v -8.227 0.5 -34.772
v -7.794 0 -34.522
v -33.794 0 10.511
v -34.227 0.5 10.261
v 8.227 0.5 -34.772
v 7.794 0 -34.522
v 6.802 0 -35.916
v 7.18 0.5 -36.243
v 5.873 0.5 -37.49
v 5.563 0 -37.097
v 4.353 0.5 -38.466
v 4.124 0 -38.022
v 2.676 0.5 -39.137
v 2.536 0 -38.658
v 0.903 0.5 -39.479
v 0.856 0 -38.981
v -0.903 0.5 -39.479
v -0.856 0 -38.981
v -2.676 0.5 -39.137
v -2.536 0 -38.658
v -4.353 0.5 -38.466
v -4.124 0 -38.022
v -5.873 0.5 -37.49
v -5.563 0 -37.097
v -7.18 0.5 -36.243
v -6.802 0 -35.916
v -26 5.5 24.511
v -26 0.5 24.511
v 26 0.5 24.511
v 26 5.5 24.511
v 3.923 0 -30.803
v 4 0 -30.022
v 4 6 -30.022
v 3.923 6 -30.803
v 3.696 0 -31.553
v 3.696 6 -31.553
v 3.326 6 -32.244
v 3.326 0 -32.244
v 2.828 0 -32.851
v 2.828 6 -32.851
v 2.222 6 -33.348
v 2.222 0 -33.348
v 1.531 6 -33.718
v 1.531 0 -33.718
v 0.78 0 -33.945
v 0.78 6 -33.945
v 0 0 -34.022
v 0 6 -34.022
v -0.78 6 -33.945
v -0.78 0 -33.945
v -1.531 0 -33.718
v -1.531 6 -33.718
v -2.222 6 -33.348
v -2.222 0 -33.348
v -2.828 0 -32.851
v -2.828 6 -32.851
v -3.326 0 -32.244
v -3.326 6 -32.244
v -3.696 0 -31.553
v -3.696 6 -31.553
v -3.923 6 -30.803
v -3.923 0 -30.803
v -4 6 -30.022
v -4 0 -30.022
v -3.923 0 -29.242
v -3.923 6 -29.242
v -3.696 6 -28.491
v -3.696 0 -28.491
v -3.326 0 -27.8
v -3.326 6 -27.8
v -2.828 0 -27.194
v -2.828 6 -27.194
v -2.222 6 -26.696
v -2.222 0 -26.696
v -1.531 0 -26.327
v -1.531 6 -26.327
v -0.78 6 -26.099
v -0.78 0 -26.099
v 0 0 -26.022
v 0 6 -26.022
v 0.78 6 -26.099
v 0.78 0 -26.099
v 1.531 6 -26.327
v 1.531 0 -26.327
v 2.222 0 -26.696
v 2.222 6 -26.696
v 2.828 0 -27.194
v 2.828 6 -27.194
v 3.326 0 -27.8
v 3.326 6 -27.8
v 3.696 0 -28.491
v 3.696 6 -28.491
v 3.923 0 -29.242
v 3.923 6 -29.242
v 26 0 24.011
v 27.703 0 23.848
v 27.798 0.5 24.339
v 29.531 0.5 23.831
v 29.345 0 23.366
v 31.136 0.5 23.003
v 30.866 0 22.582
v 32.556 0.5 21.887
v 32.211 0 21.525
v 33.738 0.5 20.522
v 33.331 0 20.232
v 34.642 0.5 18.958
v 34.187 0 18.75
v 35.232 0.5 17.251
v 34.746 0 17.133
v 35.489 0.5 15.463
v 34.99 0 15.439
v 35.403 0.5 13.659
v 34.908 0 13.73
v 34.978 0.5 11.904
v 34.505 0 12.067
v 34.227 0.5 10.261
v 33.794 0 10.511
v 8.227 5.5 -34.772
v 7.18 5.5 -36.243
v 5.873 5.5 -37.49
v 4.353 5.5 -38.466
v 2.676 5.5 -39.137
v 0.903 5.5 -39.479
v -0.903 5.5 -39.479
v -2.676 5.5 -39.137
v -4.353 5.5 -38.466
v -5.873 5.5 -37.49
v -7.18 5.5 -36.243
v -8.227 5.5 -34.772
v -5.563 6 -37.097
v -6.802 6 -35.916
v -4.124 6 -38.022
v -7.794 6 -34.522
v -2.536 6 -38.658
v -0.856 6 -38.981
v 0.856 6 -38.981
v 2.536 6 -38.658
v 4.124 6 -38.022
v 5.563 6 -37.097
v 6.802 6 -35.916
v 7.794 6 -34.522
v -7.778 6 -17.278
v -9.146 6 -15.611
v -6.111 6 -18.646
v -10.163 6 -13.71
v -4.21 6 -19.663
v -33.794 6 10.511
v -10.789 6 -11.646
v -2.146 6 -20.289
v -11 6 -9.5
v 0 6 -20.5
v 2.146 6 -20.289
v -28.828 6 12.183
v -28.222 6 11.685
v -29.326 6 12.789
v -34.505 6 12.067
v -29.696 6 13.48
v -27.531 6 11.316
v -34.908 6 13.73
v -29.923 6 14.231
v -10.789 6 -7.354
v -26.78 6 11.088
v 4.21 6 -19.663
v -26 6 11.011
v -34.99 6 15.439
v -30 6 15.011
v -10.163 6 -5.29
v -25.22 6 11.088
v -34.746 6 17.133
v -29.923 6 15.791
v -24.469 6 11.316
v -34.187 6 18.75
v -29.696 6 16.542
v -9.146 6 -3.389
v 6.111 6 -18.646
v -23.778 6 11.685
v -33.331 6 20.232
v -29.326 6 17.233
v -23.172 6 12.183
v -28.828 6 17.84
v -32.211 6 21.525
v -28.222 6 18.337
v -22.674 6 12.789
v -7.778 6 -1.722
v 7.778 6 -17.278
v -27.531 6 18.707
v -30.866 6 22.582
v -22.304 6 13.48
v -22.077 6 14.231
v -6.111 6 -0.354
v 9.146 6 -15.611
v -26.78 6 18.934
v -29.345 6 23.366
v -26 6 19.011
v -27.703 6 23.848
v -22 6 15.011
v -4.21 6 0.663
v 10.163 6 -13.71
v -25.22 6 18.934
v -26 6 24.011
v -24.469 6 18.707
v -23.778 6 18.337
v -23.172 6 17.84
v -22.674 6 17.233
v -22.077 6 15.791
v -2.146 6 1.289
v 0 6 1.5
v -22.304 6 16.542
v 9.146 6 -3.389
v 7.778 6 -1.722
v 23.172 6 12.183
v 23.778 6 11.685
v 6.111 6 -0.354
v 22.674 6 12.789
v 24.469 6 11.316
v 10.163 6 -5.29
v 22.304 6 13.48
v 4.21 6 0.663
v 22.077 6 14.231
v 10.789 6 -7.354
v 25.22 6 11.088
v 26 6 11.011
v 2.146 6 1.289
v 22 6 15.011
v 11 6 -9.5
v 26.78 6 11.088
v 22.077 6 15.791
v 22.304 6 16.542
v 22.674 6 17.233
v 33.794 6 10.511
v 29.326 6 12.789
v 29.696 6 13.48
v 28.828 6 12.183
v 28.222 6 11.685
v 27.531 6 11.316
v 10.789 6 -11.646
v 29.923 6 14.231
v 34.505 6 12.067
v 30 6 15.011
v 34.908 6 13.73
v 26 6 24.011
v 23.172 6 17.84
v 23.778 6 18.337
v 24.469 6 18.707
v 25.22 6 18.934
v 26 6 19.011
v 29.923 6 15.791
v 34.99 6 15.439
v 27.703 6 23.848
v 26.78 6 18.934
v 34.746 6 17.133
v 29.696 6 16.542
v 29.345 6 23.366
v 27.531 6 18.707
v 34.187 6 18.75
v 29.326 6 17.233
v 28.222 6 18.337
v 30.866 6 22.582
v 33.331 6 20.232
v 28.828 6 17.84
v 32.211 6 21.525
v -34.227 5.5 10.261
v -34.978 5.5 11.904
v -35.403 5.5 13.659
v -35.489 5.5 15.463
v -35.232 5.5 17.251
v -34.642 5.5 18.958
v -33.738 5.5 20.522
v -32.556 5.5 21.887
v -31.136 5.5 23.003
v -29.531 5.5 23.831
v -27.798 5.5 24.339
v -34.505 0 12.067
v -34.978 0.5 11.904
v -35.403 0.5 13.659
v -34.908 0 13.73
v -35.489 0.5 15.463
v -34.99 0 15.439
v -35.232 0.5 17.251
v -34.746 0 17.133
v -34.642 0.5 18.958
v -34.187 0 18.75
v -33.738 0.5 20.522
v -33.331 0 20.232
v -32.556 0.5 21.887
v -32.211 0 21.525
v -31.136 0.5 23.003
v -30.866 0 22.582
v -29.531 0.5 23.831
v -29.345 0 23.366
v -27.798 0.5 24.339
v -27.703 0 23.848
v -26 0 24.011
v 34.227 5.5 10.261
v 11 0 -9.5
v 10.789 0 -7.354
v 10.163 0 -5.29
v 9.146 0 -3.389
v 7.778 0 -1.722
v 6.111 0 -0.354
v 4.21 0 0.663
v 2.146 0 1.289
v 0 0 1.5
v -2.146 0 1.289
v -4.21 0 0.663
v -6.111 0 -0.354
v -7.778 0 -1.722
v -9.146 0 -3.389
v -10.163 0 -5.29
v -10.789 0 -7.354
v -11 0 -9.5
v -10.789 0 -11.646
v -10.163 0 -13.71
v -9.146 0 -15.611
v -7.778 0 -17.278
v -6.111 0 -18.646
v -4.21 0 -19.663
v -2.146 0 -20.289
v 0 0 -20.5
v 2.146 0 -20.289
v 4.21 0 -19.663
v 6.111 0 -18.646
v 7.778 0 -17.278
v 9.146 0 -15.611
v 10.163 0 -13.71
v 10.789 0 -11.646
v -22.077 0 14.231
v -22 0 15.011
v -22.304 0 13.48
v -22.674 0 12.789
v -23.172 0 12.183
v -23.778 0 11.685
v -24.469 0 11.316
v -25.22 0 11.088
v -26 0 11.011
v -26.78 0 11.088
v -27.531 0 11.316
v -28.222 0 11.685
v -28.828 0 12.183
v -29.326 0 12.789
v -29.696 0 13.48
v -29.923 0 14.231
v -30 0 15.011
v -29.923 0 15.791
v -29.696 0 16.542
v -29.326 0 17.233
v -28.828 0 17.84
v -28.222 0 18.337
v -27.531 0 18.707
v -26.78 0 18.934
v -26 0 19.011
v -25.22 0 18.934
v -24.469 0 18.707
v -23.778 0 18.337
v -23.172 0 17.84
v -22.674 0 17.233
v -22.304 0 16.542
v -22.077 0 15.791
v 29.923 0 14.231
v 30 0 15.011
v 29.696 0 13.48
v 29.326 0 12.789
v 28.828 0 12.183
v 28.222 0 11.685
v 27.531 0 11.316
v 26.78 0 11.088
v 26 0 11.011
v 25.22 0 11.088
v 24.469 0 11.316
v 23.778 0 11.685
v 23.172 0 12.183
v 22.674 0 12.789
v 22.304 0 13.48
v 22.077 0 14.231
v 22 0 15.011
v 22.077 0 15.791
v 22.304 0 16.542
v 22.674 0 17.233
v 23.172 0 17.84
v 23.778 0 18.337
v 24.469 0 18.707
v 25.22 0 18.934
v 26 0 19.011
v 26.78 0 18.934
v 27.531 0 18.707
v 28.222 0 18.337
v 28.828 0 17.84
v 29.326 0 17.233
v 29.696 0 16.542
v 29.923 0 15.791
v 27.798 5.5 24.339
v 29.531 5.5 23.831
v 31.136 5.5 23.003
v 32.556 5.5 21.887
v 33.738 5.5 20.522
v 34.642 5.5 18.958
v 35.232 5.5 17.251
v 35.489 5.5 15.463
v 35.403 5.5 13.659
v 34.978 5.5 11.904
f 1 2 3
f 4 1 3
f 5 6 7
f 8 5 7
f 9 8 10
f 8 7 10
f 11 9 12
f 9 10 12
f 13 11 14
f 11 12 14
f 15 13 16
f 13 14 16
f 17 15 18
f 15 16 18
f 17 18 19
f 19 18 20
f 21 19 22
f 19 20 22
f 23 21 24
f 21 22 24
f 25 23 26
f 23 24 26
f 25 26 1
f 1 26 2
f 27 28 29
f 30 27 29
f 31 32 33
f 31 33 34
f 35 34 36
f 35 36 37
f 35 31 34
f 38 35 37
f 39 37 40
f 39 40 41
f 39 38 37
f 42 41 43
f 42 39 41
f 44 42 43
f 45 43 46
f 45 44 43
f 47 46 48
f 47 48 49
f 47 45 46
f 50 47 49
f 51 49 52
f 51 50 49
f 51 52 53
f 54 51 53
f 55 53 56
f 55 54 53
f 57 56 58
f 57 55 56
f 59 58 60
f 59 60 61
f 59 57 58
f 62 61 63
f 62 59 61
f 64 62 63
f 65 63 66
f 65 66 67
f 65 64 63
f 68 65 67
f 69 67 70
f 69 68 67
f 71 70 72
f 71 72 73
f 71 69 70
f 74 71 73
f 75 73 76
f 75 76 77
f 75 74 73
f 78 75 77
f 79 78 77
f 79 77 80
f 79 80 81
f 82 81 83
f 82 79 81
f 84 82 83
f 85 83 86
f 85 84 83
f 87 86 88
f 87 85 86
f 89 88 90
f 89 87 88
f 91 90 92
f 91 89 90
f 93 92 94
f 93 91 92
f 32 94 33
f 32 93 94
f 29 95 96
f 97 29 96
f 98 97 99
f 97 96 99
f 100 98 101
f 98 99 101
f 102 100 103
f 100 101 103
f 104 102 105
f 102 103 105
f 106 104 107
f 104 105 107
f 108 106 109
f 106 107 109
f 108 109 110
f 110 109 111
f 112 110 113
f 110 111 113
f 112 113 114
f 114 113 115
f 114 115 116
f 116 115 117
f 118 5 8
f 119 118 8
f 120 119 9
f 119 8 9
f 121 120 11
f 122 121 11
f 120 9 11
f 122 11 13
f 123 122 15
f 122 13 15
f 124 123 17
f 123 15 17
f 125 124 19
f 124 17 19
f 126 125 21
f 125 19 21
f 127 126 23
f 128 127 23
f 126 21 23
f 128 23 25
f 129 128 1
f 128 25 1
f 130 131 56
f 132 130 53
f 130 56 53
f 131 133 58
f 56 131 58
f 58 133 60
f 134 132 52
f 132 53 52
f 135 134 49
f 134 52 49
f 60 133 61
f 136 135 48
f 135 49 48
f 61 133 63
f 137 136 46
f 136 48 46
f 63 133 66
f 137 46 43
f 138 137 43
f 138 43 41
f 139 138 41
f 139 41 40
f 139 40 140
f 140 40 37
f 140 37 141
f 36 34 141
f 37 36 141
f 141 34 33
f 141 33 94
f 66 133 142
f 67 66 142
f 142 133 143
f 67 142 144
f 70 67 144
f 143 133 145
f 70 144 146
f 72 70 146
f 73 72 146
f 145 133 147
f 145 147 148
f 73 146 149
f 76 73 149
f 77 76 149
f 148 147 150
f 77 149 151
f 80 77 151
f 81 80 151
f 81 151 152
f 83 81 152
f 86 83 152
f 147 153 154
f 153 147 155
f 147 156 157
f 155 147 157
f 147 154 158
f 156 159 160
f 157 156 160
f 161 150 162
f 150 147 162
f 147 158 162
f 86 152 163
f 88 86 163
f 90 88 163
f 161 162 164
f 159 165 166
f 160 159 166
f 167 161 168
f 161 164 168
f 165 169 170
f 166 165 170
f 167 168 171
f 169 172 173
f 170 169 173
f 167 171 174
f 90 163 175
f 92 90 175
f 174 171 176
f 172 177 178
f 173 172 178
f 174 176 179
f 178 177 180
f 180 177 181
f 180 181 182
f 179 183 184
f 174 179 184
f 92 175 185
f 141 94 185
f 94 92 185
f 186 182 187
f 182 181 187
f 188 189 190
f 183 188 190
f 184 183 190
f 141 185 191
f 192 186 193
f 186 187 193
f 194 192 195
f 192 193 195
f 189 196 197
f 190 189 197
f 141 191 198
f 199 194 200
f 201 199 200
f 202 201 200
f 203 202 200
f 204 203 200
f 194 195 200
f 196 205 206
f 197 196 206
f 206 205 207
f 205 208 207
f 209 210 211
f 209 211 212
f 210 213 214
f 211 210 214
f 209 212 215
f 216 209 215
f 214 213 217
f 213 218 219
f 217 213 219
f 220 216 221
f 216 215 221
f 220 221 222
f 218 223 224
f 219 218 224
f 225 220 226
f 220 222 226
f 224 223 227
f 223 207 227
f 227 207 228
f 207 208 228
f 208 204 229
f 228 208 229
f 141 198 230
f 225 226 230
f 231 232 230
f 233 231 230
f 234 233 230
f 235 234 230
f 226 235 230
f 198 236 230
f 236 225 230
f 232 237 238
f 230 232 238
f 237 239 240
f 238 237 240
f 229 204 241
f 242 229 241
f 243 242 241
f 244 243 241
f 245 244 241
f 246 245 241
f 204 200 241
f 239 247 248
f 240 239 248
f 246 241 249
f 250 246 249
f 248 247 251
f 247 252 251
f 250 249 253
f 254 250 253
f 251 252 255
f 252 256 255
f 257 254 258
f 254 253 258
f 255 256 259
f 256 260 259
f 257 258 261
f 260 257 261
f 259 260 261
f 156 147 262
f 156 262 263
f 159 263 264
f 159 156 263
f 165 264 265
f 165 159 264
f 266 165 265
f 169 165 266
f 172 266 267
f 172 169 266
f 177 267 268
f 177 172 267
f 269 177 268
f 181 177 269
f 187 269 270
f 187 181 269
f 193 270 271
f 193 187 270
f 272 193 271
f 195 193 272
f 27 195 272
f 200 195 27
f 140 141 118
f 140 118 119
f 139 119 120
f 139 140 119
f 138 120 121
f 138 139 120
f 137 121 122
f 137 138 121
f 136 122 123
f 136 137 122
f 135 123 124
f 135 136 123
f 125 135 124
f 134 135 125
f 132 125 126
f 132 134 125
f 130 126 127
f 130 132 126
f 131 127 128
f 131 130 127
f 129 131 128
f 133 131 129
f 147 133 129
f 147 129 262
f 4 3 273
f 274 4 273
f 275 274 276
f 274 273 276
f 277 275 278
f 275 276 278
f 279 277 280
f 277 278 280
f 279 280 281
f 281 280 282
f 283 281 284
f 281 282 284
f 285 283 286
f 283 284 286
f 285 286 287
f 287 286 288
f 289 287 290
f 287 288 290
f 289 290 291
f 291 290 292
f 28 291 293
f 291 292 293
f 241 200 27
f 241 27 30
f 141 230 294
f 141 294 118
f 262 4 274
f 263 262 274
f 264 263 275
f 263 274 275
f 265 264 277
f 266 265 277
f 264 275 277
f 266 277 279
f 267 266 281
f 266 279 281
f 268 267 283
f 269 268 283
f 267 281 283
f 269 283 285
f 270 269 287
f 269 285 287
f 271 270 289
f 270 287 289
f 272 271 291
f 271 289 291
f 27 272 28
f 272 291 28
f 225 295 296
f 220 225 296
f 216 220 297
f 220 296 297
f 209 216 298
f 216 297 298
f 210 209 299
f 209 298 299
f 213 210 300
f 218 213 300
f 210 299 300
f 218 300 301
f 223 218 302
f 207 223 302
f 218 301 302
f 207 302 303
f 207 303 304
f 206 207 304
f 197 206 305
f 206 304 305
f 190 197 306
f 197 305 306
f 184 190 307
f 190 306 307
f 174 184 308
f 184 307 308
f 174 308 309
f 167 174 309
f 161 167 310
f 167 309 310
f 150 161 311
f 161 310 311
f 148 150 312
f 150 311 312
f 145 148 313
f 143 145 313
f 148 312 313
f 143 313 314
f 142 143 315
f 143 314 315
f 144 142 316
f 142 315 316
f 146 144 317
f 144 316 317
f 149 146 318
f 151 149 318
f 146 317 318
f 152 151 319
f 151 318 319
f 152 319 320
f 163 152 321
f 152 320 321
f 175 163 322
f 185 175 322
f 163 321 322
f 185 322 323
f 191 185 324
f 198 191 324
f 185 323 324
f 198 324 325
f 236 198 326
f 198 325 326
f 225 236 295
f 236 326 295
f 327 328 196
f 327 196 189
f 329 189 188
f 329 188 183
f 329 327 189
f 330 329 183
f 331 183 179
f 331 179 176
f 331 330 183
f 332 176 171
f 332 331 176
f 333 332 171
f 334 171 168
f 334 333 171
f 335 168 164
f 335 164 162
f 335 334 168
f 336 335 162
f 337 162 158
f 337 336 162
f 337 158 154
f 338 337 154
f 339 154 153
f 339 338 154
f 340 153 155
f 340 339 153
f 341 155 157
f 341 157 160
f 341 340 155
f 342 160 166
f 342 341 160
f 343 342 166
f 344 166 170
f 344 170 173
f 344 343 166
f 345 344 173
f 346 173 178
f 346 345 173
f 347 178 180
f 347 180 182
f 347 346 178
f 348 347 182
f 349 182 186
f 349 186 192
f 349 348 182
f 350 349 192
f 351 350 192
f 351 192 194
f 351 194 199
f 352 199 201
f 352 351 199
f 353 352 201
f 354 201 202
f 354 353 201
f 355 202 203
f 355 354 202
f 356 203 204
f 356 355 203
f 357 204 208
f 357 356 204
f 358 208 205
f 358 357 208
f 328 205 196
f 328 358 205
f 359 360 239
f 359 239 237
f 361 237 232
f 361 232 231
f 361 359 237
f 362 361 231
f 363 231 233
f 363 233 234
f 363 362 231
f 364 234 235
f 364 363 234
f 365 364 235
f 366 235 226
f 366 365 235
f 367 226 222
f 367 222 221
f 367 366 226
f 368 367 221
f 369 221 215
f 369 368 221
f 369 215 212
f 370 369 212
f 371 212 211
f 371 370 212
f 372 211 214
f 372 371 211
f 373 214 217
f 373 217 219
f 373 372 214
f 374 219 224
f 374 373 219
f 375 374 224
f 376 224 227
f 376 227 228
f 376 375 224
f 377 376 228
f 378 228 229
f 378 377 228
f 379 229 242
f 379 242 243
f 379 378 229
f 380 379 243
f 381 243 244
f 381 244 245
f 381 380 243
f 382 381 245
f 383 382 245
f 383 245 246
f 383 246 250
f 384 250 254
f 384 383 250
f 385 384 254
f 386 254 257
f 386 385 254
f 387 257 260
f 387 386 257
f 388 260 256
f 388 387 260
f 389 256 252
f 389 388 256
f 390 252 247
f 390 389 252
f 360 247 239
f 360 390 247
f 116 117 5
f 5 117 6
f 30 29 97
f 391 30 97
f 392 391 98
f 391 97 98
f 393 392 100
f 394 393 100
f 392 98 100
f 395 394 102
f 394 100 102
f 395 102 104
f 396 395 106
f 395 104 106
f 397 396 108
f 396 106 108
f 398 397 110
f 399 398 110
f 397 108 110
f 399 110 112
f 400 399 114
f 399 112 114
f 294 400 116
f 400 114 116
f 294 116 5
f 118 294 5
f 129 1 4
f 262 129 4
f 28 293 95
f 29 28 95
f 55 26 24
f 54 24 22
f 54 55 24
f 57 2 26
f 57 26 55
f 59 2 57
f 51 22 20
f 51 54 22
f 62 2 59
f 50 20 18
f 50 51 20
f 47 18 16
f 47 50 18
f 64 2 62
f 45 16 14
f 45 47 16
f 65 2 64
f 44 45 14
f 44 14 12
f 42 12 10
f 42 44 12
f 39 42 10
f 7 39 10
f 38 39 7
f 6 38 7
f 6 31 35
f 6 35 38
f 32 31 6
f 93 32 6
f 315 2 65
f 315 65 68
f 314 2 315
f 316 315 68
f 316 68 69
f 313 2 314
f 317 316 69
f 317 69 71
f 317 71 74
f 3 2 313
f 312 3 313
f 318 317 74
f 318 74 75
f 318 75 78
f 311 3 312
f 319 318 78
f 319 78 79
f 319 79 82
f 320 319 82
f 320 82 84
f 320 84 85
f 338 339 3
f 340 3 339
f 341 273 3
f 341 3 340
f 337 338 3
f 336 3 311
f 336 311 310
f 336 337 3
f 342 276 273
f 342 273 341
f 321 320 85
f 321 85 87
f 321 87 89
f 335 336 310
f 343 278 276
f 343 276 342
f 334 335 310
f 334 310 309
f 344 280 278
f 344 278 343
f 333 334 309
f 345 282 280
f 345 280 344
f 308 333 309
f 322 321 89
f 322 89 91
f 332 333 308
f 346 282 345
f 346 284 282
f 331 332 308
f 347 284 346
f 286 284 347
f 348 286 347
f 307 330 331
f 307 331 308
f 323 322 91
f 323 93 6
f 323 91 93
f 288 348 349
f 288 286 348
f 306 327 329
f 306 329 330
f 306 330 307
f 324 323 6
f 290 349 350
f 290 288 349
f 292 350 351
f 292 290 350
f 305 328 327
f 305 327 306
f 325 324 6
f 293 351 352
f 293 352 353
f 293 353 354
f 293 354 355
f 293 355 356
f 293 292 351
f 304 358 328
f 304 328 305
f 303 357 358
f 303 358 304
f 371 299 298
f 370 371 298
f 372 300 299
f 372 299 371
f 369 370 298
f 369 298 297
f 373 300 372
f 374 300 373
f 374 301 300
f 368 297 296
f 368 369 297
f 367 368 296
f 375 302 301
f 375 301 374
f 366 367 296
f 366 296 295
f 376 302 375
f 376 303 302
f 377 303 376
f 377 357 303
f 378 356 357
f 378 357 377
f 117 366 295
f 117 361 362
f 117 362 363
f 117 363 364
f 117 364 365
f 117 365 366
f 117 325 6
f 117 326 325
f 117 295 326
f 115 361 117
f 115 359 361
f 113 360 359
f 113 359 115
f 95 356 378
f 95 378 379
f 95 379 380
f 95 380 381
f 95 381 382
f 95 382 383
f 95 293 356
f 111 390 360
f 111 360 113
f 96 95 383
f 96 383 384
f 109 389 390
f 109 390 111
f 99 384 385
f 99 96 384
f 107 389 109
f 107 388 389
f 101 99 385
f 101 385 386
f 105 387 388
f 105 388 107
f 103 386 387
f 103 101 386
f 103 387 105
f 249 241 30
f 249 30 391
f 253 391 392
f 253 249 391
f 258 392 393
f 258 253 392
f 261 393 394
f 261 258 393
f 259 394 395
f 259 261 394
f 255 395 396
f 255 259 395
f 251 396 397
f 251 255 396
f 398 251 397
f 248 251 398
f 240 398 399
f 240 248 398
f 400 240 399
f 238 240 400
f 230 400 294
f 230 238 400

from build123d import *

# Parameters (mm, degrees)
SKETCH_1_R          = 9.5
SKETCH_1_R_2        = 4
EXTRUDE_1_DEPTH     = 6
CHAMFER_1_SIZE      = 0.5
CUT_EXTRUDE_1_REACH = 8
SKETCH_3_R          = 15
SKETCH_4_R          = 15
SKETCH_4_R_2        = 13
EXTRUDE_2_DEPTH     = 6
SKETCH_5_R          = 13
SKETCH_5_R_2        = 11
EXTRUDE_3_DEPTH     = 6


with BuildPart() as part:
    # ｽｹｯﾁ1 → ﾎﾞｽ - 押し出し1 (new body)
    with BuildSketch(Plane(origin=(0, 0, 0), x_dir=(1, 0, 0), z_dir=(0, 1, 0))):
        with BuildLine():
            ThreePointArc((9.5, 30.022213998), (-2.458780928, 20.845918648), (-8.227241336, 34.772213998))
            Line((-8.227241336, 34.772213998), (-34.227241336, -10.261106999))
            ThreePointArc((-34.227241336, -10.261106999), (-23.541219072, -5.834811649), (-16.5, -15.011106999))
            ThreePointArc((-16.5, -15.011106999), (-19.282485579, -21.72862142), (-26, -24.511106999))
            Line((-26, -24.511106999), (26, -24.511106999))
            ThreePointArc((26, -24.511106999), (17.772758664, -10.261106999), (34.227241336, -10.261106999))
            Line((34.227241336, -10.261106999), (8.227241336, 34.772213998))
            ThreePointArc((8.227241336, 34.772213998), (9.17629535, 32.480994926), (9.5, 30.022213998))
        make_face()
        with Locations((-26, -15.011106999)):
            Circle(SKETCH_1_R)
        with Locations((-26, -15.011106999)):
            Circle(SKETCH_1_R_2, mode=Mode.SUBTRACT)
        with Locations((26, -15.011106999)):
            Circle(SKETCH_1_R)
        with Locations((26, -15.011106999)):
            Circle(SKETCH_1_R_2, mode=Mode.SUBTRACT)
        with Locations((0, 30.022213998)):
            Circle(SKETCH_1_R)
        with Locations((0, 30.022213998)):
            Circle(SKETCH_1_R_2, mode=Mode.SUBTRACT)
    extrude(amount=EXTRUDE_1_DEPTH)

    # 面取り1
    chamfer_1_edges = [part.edges().sort_by_distance(p)[0] for p in [
        (-34.227241336, 6, 19.761106999),
        (0, 0, -39.522213998),
        (21.227241336, 0, -12.255553499),
        (34.227241336, 0, 19.761106999),
        (0, 0, 24.511106999),
        (-34.227241336, 0, 19.761106999),
        (-21.227241336, 0, -12.255553499),
        (0, 6, 24.511106999),
        (34.227241336, 6, 19.761106999),
        (21.227241336, 6, -12.255553499),
        (0, 6, -39.522213998),
        (-21.227241336, 6, -12.255553499),
    ]]
    chamfer(chamfer_1_edges, length=CHAMFER_1_SIZE)

    # ｽｹｯﾁ3 → ｶｯﾄ - 押し出し1 (cut, up to next)
    with BuildSketch(Plane.XZ, mode=Mode.PRIVATE) as cut_extrude_1_sk1:
        with Locations((0, -9.5)):
            Circle(SKETCH_3_R)
    cut_extrude_1_tool1 = extrude(cut_extrude_1_sk1.sketch, amount=-CUT_EXTRUDE_1_REACH, mode=Mode.PRIVATE) & part.part
    add(cut_extrude_1_tool1.solids().sort_by_distance((0, 0, -9.5))[0], mode=Mode.SUBTRACT)

    # ｽｹｯﾁ4 → ﾎﾞｽ - 押し出し2 (add)
    with BuildSketch(Plane.XZ):
        with Locations((0, -9.5)):
            Circle(SKETCH_4_R)
        with Locations((0, -9.5)):
            Circle(SKETCH_4_R_2, mode=Mode.SUBTRACT)
    extrude(amount=-EXTRUDE_2_DEPTH)

    # ｽｹｯﾁ5 → ﾎﾞｽ - 押し出し3 (add)
    with BuildSketch(Plane.XZ):
        with Locations((0, -9.5)):
            Circle(SKETCH_5_R)
        with Locations((0, -9.5)):
            Circle(SKETCH_5_R_2, mode=Mode.SUBTRACT)
    extrude(amount=-EXTRUDE_3_DEPTH)


solid = part.part
